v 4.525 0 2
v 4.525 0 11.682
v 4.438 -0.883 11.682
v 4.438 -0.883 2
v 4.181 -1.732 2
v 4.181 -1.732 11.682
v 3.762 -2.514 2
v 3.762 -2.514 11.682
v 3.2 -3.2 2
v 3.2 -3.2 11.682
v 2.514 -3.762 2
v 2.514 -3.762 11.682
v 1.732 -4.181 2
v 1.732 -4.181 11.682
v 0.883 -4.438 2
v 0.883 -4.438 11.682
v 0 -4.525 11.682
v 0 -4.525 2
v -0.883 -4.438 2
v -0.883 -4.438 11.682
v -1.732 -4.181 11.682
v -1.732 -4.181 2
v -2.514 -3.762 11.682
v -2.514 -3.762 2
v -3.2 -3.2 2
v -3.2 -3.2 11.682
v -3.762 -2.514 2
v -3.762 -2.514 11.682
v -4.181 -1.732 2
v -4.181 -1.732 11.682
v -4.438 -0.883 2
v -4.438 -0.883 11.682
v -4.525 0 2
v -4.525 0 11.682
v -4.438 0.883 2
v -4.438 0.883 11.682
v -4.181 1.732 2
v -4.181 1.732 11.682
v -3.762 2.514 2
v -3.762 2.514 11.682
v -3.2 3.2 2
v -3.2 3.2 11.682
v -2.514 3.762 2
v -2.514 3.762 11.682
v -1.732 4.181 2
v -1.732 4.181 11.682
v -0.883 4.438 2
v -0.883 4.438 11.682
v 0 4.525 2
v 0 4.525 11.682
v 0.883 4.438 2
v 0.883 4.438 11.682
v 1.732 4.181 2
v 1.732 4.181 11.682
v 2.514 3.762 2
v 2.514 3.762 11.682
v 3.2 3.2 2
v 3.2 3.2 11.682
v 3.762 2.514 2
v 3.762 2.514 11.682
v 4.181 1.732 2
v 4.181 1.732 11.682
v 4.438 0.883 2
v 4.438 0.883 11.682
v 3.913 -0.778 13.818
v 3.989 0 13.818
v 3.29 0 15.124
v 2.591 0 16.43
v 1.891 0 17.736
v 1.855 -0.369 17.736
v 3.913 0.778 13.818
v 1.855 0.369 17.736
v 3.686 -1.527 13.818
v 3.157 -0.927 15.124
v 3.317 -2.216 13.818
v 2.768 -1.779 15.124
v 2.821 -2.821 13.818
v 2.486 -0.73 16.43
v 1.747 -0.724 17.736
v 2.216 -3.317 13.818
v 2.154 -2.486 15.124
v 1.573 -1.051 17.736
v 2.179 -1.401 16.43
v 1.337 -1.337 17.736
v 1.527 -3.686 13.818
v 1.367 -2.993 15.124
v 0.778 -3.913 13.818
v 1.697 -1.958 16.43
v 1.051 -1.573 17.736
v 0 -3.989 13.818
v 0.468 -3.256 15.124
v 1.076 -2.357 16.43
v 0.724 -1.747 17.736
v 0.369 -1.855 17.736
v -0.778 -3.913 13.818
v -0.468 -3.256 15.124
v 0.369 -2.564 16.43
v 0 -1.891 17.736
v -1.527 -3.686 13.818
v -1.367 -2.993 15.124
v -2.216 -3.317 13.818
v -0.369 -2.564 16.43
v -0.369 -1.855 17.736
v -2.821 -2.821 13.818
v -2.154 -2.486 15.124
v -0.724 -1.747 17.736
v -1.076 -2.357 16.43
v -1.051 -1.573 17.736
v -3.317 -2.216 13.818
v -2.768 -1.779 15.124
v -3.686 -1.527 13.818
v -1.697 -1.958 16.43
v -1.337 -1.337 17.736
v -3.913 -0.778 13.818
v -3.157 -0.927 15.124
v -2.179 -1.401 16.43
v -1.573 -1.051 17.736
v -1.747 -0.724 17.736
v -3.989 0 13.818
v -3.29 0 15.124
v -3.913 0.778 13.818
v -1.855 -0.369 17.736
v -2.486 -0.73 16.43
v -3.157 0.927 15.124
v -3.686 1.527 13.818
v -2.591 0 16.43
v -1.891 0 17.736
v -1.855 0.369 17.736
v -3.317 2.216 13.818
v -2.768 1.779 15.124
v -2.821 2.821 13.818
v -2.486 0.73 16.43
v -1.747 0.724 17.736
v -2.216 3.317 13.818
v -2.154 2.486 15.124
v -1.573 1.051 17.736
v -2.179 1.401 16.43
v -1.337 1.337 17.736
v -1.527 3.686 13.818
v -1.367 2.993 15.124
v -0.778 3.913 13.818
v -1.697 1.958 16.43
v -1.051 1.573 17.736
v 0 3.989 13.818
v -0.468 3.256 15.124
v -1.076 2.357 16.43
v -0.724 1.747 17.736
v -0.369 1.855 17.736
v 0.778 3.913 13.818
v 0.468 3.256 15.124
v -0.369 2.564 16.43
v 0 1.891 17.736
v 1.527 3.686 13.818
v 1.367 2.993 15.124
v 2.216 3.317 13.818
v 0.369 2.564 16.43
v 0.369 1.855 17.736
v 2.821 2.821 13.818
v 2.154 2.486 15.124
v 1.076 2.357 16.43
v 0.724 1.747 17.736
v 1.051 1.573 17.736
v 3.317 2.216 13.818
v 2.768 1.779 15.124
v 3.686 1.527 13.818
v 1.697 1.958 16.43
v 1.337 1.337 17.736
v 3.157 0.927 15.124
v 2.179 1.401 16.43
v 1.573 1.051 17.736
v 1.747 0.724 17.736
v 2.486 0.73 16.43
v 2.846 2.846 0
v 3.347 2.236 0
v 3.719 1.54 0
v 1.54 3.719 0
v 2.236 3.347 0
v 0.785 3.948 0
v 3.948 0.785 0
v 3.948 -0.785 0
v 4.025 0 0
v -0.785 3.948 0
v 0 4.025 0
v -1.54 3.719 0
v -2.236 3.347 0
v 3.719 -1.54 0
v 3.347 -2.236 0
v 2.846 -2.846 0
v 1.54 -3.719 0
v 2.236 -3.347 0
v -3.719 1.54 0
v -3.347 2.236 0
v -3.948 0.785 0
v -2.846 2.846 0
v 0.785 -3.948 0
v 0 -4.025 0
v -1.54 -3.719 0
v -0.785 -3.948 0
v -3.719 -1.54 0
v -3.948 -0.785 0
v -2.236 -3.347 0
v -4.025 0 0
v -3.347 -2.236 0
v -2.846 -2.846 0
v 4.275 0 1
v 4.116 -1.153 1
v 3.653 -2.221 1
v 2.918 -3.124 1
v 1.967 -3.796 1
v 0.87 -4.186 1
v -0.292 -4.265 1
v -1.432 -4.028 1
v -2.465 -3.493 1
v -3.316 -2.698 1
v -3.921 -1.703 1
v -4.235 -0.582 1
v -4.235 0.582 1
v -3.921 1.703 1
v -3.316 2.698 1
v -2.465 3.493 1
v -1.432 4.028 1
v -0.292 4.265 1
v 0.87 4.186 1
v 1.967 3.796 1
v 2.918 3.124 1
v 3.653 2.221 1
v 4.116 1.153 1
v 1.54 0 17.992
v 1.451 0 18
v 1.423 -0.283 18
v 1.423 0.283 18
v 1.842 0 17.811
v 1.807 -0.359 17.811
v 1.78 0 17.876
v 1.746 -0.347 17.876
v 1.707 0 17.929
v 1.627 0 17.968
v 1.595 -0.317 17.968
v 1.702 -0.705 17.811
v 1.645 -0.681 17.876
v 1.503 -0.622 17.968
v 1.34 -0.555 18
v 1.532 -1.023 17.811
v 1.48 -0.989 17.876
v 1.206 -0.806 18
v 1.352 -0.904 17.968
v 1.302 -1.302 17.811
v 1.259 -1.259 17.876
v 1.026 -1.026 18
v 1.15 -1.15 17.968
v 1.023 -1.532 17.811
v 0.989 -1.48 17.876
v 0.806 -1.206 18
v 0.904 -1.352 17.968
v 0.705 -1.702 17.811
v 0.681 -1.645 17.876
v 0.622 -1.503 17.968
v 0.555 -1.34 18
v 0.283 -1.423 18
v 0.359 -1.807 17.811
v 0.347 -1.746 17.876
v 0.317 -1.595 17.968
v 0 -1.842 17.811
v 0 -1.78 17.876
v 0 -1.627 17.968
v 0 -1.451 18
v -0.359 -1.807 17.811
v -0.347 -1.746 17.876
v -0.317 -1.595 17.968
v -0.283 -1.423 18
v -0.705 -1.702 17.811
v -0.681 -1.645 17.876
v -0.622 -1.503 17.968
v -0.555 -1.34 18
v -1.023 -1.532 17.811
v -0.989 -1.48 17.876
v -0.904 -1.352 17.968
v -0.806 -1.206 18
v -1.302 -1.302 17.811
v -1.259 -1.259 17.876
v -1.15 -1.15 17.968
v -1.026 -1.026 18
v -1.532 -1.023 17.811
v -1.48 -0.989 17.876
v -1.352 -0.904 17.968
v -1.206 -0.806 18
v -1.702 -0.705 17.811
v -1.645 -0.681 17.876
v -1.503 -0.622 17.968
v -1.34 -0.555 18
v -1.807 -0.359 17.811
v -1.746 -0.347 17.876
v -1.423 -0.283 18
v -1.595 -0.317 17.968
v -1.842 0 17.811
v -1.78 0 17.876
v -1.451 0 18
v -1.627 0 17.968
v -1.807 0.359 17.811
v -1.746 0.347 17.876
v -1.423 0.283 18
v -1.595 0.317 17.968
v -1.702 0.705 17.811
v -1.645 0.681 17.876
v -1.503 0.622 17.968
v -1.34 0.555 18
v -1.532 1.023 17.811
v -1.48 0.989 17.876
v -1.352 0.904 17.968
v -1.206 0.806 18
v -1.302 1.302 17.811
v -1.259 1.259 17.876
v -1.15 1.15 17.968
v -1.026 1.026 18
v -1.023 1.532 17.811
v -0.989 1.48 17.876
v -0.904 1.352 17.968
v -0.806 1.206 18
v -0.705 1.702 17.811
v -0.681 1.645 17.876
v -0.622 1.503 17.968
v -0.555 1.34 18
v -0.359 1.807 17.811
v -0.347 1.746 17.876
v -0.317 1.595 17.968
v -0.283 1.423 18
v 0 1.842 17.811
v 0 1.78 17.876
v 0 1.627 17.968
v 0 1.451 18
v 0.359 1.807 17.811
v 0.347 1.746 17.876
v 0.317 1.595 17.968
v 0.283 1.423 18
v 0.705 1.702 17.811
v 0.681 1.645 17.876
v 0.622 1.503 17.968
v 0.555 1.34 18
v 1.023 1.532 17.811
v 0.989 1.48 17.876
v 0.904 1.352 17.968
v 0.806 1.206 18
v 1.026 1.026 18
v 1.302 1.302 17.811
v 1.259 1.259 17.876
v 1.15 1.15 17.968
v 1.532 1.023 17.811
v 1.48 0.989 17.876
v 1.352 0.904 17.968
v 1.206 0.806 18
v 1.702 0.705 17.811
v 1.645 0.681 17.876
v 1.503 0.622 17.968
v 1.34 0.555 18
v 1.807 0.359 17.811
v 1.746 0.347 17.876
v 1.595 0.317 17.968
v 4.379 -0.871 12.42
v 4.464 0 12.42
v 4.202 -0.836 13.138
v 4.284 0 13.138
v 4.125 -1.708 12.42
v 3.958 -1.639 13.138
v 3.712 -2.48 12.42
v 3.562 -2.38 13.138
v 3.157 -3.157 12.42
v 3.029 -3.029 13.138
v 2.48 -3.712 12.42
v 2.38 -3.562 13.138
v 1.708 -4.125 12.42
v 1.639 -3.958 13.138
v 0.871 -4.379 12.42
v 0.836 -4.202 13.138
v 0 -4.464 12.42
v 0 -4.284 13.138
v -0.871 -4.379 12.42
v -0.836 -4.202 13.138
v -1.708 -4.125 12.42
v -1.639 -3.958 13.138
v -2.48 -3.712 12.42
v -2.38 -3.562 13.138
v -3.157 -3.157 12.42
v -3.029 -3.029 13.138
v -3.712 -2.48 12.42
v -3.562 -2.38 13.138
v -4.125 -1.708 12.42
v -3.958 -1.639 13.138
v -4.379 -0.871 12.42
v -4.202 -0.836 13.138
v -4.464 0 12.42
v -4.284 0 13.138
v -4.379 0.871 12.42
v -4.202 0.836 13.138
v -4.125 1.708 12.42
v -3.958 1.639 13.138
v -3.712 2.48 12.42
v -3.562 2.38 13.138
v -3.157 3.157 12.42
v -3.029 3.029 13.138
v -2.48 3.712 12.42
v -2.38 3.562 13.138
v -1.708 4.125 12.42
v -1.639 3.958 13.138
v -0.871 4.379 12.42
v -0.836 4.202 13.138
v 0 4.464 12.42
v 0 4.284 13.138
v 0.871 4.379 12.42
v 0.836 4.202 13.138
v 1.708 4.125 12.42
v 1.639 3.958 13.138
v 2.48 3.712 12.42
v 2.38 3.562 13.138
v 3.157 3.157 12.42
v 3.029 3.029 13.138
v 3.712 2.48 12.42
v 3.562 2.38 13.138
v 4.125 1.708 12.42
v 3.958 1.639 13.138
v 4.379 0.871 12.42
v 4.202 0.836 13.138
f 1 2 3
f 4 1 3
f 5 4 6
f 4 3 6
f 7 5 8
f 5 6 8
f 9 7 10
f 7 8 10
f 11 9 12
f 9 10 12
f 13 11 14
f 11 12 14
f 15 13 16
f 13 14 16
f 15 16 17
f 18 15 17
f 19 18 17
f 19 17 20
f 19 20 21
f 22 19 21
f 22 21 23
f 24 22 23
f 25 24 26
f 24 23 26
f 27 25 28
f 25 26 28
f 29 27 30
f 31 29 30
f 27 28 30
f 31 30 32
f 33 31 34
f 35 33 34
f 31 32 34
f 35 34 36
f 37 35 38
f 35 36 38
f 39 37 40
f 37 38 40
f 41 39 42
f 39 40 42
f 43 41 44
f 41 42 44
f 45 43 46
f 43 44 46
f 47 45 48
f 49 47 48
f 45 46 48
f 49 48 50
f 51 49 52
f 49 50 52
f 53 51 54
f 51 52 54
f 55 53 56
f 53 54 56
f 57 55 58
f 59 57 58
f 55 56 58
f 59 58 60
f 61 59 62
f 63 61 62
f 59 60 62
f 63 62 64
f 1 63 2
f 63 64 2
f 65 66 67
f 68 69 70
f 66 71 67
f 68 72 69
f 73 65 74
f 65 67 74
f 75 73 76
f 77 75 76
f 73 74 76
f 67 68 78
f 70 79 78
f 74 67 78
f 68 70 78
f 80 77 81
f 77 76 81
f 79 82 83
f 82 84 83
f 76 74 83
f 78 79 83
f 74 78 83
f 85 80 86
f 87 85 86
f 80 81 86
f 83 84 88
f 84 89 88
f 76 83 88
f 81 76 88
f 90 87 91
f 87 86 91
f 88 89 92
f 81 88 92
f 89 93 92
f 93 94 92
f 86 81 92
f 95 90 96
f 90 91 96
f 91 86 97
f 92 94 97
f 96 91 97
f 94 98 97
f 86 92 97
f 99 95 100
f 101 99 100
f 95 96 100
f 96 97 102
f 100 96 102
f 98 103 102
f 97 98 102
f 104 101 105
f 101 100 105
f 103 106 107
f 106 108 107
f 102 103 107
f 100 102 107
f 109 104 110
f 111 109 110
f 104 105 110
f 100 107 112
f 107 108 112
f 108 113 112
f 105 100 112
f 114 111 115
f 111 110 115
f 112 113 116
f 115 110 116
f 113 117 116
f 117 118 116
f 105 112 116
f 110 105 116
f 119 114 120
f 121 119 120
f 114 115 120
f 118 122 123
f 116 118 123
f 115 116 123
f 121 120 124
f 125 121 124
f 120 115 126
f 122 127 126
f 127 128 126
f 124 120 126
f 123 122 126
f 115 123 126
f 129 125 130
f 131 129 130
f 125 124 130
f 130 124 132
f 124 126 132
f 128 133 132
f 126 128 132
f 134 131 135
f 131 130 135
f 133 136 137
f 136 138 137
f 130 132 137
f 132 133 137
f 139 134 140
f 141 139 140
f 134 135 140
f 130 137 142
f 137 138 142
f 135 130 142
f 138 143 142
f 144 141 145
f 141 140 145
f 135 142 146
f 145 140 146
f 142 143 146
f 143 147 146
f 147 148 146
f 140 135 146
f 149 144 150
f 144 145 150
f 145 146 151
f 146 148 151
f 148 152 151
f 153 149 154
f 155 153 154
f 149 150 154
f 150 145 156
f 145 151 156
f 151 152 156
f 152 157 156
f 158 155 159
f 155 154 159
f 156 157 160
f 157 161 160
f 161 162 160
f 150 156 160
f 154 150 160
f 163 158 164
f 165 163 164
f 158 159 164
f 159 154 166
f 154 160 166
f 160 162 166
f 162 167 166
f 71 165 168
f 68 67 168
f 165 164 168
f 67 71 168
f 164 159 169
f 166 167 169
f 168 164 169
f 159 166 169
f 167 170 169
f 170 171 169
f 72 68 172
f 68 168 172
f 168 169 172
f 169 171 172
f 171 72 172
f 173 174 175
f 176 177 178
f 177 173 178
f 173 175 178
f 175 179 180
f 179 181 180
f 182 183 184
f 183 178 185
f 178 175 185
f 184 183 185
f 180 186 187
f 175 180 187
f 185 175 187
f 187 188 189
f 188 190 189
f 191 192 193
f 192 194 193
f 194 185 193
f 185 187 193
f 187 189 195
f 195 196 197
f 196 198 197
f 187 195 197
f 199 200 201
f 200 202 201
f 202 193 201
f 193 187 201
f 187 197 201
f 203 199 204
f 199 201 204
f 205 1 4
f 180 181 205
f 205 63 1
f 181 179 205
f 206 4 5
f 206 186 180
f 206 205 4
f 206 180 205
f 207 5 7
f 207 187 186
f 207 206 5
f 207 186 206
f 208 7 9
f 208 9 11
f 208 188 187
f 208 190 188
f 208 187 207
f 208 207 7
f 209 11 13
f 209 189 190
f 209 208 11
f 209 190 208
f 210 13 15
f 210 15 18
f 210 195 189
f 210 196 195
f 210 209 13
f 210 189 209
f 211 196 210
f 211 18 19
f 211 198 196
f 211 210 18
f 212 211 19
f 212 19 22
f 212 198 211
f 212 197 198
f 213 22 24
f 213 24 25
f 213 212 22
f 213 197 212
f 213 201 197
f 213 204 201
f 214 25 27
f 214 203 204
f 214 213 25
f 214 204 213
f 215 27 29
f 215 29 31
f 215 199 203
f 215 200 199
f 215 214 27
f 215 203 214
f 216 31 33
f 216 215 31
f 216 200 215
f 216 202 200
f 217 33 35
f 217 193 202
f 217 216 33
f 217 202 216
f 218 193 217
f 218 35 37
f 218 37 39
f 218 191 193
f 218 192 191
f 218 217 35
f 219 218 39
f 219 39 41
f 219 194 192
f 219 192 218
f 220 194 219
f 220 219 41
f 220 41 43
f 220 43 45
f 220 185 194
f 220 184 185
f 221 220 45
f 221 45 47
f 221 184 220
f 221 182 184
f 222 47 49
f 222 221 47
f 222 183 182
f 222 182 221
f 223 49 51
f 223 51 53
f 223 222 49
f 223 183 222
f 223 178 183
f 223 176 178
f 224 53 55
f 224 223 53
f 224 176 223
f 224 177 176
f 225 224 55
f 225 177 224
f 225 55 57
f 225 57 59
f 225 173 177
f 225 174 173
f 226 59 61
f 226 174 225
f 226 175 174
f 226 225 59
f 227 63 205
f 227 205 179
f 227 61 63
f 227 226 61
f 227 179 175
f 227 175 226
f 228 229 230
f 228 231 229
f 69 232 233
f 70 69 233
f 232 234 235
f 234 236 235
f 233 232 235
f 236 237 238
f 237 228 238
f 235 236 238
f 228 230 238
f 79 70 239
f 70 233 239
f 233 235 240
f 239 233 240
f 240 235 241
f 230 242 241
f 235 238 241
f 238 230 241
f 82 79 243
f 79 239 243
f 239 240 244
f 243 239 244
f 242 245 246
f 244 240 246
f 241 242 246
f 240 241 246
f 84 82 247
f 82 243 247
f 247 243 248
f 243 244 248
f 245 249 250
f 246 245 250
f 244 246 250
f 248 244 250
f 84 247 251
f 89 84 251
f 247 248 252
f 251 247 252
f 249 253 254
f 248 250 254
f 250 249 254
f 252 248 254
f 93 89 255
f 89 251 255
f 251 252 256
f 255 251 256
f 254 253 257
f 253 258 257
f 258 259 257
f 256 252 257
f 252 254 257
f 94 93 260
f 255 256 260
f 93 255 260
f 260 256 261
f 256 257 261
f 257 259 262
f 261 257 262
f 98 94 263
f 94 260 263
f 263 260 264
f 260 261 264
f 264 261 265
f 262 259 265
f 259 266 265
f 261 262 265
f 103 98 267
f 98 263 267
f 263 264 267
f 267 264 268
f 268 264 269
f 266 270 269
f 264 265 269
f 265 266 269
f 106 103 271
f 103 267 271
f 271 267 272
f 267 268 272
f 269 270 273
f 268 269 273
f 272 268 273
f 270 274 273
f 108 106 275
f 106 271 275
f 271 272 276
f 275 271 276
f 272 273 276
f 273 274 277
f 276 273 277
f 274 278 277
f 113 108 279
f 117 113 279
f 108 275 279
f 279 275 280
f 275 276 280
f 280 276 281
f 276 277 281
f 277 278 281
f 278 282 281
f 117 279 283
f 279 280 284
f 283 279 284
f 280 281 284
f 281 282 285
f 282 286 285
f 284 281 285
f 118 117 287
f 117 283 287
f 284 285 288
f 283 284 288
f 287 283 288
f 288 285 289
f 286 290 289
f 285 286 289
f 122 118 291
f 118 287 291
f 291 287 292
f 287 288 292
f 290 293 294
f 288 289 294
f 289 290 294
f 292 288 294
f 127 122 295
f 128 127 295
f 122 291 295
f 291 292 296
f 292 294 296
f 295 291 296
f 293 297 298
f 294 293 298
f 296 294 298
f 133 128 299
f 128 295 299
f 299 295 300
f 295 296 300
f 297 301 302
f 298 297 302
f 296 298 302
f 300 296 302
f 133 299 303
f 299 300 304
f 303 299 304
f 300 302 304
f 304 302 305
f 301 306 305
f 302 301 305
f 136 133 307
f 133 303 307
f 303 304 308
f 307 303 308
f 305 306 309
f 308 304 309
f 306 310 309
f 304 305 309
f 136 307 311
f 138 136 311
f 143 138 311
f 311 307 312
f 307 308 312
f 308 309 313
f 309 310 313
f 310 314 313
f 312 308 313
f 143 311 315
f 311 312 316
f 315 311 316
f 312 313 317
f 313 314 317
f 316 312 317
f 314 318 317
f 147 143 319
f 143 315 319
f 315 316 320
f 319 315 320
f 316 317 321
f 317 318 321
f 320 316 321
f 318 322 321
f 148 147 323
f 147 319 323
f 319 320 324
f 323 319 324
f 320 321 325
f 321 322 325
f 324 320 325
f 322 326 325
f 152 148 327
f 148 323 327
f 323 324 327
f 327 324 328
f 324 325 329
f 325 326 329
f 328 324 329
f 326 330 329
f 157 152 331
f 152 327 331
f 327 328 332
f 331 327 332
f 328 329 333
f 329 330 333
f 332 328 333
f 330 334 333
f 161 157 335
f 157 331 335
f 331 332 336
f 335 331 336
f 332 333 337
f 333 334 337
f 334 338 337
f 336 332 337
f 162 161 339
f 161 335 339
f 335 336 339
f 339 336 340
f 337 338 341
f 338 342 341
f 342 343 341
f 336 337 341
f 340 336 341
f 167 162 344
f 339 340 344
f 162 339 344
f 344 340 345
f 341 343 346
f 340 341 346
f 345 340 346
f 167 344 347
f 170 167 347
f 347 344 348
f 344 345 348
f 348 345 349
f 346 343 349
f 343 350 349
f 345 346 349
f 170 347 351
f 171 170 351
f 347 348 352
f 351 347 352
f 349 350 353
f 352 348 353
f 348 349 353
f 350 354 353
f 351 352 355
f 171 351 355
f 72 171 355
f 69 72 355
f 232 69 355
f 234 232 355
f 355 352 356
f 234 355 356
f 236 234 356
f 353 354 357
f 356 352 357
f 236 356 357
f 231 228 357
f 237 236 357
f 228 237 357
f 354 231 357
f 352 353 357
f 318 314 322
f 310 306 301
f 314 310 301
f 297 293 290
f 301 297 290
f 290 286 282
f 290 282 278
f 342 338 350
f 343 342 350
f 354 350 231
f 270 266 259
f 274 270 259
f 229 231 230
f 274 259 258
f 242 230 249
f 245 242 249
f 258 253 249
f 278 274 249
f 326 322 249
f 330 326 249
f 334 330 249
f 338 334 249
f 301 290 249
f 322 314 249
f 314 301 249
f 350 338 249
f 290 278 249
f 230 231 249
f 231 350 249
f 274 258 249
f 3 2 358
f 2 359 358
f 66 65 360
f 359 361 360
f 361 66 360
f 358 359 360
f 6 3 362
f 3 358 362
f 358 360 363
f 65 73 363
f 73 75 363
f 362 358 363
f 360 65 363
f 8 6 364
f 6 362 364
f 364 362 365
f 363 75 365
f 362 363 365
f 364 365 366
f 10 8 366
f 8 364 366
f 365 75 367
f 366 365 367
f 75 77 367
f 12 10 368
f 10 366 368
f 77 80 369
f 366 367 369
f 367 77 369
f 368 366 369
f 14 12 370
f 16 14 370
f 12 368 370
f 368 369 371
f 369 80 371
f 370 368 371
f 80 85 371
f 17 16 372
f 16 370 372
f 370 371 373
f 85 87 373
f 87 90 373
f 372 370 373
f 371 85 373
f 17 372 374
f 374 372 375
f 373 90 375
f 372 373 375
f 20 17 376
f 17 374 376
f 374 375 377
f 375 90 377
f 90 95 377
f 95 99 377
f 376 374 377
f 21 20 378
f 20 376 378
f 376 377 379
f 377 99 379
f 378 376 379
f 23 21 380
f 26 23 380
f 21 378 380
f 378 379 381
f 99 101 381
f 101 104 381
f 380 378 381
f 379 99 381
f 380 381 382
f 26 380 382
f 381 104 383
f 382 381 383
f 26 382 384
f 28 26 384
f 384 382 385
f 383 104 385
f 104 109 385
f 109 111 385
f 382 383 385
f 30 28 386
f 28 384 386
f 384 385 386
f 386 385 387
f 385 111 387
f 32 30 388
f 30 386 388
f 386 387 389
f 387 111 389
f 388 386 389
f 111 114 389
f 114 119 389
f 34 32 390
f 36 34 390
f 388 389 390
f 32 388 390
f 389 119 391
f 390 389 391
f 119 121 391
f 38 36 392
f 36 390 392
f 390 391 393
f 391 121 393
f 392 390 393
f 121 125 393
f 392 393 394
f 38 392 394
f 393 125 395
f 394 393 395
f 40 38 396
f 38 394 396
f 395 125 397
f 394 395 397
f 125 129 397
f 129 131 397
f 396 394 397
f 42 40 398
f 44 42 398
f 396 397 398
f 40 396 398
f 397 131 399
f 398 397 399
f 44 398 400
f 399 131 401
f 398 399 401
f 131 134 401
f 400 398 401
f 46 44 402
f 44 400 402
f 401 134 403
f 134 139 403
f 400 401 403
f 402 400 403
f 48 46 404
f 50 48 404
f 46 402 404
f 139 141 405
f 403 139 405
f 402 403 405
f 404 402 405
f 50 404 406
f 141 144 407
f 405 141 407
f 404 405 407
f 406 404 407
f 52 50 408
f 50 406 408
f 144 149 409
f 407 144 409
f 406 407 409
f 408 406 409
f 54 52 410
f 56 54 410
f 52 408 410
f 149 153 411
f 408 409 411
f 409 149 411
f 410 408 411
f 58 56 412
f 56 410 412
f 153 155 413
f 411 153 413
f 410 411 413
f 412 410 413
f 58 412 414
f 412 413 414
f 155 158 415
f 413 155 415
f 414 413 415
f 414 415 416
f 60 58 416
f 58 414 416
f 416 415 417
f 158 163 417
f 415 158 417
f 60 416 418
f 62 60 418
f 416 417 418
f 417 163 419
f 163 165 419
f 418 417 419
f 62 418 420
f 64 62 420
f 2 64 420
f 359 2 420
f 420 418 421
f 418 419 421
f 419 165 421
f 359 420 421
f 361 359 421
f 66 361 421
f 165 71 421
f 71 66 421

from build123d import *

# Parameters (mm, degrees)
F2_R     = 0.5
F3_SIZE2 = 0.5
F3_SIZE  = 2


with BuildPart() as f1:
    # F0 (on Front) → F1 (revolve)
    with BuildSketch(Plane.XZ):
        with BuildLine():
            Line((0, 18), (0, 0))
            Line((0, 0), (4.525, 0))
            Line((4.525, 0), (4.525, 11.681882))
            ThreePointArc((4.525, 11.681882), (4.389009, 12.782892), (3.989211, 13.817724))
            Line((3.989211, 13.817724), (1.75, 18))
            Line((1.75, 18), (0, 18))
        make_face()
    revolve(axis=Axis((0, 0, -7.393045), (0, 0, -1)))

    # F2
    f2_edges = [f1.edges().sort_by_distance(p)[0] for p in [
        (-1.75, 0, 18),
    ]]
    fillet(f2_edges, radius=F2_R)

    # F3
    f3_edges = [f1.edges().sort_by_distance(p)[0] for p in [
        (-4.525, 0, 0),
    ]]
    chamfer(f3_edges, length=F3_SIZE, length2=F3_SIZE2)


solid = f1.part
